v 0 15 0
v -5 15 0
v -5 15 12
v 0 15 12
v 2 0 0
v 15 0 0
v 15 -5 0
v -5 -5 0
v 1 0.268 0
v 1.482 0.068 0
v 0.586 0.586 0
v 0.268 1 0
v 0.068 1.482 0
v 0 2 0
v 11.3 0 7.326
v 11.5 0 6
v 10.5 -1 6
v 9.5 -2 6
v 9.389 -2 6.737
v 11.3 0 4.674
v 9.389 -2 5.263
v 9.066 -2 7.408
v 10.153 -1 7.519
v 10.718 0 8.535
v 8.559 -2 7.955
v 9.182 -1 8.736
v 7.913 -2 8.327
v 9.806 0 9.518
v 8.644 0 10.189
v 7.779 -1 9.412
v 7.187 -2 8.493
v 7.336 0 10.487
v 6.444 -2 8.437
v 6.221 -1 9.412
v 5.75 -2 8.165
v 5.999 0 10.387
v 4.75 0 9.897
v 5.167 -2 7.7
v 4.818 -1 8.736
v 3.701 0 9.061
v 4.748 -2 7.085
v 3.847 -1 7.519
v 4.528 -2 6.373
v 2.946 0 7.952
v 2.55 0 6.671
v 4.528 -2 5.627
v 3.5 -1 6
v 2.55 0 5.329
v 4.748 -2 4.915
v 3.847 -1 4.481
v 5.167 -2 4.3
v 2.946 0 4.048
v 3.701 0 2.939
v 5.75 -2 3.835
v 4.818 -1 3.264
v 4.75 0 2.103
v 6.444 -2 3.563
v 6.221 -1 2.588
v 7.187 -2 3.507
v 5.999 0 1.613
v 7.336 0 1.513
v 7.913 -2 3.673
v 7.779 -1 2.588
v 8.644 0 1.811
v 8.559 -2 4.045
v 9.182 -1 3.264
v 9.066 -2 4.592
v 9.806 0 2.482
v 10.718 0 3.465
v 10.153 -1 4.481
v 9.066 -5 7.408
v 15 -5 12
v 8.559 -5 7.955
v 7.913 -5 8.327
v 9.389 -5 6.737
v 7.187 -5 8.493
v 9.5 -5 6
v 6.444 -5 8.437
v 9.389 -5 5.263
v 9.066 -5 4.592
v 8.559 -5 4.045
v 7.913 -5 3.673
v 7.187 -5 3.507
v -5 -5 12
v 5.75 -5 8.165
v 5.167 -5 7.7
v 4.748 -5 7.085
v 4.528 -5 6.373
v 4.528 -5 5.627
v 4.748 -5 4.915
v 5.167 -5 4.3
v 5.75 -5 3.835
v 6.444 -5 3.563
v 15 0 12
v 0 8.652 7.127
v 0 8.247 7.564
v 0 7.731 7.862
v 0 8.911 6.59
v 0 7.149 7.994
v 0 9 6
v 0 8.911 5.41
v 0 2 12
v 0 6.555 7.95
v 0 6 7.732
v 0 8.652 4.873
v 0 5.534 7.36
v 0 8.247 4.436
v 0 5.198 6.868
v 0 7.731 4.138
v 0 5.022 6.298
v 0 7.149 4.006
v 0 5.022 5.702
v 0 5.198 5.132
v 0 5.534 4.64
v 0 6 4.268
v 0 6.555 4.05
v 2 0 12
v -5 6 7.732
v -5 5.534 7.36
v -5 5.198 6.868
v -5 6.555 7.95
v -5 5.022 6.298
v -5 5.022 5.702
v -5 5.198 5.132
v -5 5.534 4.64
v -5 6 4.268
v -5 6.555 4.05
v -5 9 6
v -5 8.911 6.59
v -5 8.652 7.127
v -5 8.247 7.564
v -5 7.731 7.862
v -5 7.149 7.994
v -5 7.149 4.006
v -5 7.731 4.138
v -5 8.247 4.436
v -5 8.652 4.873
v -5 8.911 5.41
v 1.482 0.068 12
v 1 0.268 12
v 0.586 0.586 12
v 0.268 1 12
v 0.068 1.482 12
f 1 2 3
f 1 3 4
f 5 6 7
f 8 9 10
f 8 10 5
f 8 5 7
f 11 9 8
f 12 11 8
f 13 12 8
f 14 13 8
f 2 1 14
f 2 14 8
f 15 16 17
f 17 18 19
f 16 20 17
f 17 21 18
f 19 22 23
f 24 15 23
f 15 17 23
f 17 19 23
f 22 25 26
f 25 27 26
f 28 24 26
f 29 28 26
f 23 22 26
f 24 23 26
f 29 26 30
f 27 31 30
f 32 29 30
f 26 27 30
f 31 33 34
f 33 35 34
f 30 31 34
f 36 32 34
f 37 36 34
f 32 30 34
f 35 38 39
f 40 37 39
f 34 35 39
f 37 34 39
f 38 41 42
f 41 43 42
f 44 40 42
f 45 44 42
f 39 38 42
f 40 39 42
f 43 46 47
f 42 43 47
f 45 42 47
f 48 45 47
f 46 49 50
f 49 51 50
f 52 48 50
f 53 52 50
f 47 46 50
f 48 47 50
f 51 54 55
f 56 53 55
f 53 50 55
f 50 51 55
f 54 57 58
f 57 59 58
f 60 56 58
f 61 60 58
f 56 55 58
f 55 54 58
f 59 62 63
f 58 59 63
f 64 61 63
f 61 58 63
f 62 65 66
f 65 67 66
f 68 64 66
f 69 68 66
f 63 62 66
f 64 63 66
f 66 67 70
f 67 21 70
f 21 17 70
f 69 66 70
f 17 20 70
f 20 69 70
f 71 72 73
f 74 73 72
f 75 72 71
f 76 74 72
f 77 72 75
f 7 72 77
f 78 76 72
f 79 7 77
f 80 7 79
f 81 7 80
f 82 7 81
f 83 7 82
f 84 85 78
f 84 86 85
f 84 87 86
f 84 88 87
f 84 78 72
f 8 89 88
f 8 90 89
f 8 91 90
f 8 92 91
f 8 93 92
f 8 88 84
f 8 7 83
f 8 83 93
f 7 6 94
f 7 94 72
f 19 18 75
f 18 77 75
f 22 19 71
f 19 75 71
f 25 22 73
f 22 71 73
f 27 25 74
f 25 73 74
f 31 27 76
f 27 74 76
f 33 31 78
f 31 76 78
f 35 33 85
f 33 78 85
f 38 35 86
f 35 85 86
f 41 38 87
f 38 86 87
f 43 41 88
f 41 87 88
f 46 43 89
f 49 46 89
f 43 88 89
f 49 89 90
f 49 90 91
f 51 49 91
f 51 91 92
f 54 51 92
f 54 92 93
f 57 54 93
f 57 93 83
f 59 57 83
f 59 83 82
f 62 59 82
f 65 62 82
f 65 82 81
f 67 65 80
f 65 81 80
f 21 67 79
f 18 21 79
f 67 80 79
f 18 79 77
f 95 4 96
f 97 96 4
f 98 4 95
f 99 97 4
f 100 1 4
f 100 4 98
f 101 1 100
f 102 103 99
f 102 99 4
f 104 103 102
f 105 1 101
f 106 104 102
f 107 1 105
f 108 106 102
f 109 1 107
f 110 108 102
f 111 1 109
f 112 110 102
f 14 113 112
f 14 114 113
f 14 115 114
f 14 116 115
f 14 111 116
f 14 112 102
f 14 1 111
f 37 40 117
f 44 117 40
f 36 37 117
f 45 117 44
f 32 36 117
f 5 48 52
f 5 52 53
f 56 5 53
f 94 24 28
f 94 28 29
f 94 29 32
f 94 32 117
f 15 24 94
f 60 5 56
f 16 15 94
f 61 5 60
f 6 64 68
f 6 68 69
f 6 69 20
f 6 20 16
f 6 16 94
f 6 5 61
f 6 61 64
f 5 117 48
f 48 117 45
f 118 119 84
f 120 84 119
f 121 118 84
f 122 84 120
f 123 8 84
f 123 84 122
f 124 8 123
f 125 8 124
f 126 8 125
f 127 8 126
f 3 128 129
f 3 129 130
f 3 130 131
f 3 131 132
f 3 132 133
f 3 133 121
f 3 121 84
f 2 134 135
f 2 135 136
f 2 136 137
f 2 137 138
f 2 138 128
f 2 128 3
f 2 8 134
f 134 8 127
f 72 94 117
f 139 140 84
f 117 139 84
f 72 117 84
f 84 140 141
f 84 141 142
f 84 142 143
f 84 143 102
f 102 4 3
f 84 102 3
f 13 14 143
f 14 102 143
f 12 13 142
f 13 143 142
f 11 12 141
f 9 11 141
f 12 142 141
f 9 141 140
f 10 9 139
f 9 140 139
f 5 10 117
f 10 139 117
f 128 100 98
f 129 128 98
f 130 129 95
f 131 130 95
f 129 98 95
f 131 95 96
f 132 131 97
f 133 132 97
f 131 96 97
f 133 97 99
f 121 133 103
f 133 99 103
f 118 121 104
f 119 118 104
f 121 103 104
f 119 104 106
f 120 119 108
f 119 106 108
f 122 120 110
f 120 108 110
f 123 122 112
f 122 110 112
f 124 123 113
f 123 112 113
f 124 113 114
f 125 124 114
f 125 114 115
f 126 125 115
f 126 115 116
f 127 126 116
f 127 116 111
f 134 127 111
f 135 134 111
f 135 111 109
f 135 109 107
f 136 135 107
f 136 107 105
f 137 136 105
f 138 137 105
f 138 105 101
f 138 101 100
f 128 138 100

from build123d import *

# Parameters (mm, degrees)
PAD_DEPTH           = 12
SKETCH001_R         = 2
HOLE_DEPTH          = 5.001
HOLE001_D           = 5
HOLE001_DEPTH       = 25
HOLE001_CSINK_D     = 9
HOLE001_CSINK_ANGLE = 90
FILLET_R            = 2


with BuildPart() as part:
    # Sketch → Pad (new body)
    with BuildSketch(Plane.XY):
        Polygon((0, 15), (0, 0), (15, 0), (15, -5), (-5, -5), (-5, 15), align=None)
    extrude(amount=PAD_DEPTH)

    # Sketch001 (on Face1 of Pad) → Hole (cut, through all)
    with BuildSketch(Plane.YZ):
        with Locations((7, 6)):
            Circle(SKETCH001_R)
    extrude(amount=-HOLE_DEPTH, mode=Mode.SUBTRACT)

    # Hole001
    with Locations(Plane(origin=(0, 0, 0), x_dir=(-1, 0, 0), z_dir=(0, 1, 0))):
        with Locations((-7, 6)):
            CounterSinkHole(HOLE001_D / 2, HOLE001_CSINK_D / 2, depth=HOLE001_DEPTH, counter_sink_angle=HOLE001_CSINK_ANGLE)

    # Fillet
    fillet_edges = [part.edges().sort_by_distance(p)[0] for p in [
        (0, 0, 6),
    ]]
    fillet(fillet_edges, radius=FILLET_R)


solid = part.part
